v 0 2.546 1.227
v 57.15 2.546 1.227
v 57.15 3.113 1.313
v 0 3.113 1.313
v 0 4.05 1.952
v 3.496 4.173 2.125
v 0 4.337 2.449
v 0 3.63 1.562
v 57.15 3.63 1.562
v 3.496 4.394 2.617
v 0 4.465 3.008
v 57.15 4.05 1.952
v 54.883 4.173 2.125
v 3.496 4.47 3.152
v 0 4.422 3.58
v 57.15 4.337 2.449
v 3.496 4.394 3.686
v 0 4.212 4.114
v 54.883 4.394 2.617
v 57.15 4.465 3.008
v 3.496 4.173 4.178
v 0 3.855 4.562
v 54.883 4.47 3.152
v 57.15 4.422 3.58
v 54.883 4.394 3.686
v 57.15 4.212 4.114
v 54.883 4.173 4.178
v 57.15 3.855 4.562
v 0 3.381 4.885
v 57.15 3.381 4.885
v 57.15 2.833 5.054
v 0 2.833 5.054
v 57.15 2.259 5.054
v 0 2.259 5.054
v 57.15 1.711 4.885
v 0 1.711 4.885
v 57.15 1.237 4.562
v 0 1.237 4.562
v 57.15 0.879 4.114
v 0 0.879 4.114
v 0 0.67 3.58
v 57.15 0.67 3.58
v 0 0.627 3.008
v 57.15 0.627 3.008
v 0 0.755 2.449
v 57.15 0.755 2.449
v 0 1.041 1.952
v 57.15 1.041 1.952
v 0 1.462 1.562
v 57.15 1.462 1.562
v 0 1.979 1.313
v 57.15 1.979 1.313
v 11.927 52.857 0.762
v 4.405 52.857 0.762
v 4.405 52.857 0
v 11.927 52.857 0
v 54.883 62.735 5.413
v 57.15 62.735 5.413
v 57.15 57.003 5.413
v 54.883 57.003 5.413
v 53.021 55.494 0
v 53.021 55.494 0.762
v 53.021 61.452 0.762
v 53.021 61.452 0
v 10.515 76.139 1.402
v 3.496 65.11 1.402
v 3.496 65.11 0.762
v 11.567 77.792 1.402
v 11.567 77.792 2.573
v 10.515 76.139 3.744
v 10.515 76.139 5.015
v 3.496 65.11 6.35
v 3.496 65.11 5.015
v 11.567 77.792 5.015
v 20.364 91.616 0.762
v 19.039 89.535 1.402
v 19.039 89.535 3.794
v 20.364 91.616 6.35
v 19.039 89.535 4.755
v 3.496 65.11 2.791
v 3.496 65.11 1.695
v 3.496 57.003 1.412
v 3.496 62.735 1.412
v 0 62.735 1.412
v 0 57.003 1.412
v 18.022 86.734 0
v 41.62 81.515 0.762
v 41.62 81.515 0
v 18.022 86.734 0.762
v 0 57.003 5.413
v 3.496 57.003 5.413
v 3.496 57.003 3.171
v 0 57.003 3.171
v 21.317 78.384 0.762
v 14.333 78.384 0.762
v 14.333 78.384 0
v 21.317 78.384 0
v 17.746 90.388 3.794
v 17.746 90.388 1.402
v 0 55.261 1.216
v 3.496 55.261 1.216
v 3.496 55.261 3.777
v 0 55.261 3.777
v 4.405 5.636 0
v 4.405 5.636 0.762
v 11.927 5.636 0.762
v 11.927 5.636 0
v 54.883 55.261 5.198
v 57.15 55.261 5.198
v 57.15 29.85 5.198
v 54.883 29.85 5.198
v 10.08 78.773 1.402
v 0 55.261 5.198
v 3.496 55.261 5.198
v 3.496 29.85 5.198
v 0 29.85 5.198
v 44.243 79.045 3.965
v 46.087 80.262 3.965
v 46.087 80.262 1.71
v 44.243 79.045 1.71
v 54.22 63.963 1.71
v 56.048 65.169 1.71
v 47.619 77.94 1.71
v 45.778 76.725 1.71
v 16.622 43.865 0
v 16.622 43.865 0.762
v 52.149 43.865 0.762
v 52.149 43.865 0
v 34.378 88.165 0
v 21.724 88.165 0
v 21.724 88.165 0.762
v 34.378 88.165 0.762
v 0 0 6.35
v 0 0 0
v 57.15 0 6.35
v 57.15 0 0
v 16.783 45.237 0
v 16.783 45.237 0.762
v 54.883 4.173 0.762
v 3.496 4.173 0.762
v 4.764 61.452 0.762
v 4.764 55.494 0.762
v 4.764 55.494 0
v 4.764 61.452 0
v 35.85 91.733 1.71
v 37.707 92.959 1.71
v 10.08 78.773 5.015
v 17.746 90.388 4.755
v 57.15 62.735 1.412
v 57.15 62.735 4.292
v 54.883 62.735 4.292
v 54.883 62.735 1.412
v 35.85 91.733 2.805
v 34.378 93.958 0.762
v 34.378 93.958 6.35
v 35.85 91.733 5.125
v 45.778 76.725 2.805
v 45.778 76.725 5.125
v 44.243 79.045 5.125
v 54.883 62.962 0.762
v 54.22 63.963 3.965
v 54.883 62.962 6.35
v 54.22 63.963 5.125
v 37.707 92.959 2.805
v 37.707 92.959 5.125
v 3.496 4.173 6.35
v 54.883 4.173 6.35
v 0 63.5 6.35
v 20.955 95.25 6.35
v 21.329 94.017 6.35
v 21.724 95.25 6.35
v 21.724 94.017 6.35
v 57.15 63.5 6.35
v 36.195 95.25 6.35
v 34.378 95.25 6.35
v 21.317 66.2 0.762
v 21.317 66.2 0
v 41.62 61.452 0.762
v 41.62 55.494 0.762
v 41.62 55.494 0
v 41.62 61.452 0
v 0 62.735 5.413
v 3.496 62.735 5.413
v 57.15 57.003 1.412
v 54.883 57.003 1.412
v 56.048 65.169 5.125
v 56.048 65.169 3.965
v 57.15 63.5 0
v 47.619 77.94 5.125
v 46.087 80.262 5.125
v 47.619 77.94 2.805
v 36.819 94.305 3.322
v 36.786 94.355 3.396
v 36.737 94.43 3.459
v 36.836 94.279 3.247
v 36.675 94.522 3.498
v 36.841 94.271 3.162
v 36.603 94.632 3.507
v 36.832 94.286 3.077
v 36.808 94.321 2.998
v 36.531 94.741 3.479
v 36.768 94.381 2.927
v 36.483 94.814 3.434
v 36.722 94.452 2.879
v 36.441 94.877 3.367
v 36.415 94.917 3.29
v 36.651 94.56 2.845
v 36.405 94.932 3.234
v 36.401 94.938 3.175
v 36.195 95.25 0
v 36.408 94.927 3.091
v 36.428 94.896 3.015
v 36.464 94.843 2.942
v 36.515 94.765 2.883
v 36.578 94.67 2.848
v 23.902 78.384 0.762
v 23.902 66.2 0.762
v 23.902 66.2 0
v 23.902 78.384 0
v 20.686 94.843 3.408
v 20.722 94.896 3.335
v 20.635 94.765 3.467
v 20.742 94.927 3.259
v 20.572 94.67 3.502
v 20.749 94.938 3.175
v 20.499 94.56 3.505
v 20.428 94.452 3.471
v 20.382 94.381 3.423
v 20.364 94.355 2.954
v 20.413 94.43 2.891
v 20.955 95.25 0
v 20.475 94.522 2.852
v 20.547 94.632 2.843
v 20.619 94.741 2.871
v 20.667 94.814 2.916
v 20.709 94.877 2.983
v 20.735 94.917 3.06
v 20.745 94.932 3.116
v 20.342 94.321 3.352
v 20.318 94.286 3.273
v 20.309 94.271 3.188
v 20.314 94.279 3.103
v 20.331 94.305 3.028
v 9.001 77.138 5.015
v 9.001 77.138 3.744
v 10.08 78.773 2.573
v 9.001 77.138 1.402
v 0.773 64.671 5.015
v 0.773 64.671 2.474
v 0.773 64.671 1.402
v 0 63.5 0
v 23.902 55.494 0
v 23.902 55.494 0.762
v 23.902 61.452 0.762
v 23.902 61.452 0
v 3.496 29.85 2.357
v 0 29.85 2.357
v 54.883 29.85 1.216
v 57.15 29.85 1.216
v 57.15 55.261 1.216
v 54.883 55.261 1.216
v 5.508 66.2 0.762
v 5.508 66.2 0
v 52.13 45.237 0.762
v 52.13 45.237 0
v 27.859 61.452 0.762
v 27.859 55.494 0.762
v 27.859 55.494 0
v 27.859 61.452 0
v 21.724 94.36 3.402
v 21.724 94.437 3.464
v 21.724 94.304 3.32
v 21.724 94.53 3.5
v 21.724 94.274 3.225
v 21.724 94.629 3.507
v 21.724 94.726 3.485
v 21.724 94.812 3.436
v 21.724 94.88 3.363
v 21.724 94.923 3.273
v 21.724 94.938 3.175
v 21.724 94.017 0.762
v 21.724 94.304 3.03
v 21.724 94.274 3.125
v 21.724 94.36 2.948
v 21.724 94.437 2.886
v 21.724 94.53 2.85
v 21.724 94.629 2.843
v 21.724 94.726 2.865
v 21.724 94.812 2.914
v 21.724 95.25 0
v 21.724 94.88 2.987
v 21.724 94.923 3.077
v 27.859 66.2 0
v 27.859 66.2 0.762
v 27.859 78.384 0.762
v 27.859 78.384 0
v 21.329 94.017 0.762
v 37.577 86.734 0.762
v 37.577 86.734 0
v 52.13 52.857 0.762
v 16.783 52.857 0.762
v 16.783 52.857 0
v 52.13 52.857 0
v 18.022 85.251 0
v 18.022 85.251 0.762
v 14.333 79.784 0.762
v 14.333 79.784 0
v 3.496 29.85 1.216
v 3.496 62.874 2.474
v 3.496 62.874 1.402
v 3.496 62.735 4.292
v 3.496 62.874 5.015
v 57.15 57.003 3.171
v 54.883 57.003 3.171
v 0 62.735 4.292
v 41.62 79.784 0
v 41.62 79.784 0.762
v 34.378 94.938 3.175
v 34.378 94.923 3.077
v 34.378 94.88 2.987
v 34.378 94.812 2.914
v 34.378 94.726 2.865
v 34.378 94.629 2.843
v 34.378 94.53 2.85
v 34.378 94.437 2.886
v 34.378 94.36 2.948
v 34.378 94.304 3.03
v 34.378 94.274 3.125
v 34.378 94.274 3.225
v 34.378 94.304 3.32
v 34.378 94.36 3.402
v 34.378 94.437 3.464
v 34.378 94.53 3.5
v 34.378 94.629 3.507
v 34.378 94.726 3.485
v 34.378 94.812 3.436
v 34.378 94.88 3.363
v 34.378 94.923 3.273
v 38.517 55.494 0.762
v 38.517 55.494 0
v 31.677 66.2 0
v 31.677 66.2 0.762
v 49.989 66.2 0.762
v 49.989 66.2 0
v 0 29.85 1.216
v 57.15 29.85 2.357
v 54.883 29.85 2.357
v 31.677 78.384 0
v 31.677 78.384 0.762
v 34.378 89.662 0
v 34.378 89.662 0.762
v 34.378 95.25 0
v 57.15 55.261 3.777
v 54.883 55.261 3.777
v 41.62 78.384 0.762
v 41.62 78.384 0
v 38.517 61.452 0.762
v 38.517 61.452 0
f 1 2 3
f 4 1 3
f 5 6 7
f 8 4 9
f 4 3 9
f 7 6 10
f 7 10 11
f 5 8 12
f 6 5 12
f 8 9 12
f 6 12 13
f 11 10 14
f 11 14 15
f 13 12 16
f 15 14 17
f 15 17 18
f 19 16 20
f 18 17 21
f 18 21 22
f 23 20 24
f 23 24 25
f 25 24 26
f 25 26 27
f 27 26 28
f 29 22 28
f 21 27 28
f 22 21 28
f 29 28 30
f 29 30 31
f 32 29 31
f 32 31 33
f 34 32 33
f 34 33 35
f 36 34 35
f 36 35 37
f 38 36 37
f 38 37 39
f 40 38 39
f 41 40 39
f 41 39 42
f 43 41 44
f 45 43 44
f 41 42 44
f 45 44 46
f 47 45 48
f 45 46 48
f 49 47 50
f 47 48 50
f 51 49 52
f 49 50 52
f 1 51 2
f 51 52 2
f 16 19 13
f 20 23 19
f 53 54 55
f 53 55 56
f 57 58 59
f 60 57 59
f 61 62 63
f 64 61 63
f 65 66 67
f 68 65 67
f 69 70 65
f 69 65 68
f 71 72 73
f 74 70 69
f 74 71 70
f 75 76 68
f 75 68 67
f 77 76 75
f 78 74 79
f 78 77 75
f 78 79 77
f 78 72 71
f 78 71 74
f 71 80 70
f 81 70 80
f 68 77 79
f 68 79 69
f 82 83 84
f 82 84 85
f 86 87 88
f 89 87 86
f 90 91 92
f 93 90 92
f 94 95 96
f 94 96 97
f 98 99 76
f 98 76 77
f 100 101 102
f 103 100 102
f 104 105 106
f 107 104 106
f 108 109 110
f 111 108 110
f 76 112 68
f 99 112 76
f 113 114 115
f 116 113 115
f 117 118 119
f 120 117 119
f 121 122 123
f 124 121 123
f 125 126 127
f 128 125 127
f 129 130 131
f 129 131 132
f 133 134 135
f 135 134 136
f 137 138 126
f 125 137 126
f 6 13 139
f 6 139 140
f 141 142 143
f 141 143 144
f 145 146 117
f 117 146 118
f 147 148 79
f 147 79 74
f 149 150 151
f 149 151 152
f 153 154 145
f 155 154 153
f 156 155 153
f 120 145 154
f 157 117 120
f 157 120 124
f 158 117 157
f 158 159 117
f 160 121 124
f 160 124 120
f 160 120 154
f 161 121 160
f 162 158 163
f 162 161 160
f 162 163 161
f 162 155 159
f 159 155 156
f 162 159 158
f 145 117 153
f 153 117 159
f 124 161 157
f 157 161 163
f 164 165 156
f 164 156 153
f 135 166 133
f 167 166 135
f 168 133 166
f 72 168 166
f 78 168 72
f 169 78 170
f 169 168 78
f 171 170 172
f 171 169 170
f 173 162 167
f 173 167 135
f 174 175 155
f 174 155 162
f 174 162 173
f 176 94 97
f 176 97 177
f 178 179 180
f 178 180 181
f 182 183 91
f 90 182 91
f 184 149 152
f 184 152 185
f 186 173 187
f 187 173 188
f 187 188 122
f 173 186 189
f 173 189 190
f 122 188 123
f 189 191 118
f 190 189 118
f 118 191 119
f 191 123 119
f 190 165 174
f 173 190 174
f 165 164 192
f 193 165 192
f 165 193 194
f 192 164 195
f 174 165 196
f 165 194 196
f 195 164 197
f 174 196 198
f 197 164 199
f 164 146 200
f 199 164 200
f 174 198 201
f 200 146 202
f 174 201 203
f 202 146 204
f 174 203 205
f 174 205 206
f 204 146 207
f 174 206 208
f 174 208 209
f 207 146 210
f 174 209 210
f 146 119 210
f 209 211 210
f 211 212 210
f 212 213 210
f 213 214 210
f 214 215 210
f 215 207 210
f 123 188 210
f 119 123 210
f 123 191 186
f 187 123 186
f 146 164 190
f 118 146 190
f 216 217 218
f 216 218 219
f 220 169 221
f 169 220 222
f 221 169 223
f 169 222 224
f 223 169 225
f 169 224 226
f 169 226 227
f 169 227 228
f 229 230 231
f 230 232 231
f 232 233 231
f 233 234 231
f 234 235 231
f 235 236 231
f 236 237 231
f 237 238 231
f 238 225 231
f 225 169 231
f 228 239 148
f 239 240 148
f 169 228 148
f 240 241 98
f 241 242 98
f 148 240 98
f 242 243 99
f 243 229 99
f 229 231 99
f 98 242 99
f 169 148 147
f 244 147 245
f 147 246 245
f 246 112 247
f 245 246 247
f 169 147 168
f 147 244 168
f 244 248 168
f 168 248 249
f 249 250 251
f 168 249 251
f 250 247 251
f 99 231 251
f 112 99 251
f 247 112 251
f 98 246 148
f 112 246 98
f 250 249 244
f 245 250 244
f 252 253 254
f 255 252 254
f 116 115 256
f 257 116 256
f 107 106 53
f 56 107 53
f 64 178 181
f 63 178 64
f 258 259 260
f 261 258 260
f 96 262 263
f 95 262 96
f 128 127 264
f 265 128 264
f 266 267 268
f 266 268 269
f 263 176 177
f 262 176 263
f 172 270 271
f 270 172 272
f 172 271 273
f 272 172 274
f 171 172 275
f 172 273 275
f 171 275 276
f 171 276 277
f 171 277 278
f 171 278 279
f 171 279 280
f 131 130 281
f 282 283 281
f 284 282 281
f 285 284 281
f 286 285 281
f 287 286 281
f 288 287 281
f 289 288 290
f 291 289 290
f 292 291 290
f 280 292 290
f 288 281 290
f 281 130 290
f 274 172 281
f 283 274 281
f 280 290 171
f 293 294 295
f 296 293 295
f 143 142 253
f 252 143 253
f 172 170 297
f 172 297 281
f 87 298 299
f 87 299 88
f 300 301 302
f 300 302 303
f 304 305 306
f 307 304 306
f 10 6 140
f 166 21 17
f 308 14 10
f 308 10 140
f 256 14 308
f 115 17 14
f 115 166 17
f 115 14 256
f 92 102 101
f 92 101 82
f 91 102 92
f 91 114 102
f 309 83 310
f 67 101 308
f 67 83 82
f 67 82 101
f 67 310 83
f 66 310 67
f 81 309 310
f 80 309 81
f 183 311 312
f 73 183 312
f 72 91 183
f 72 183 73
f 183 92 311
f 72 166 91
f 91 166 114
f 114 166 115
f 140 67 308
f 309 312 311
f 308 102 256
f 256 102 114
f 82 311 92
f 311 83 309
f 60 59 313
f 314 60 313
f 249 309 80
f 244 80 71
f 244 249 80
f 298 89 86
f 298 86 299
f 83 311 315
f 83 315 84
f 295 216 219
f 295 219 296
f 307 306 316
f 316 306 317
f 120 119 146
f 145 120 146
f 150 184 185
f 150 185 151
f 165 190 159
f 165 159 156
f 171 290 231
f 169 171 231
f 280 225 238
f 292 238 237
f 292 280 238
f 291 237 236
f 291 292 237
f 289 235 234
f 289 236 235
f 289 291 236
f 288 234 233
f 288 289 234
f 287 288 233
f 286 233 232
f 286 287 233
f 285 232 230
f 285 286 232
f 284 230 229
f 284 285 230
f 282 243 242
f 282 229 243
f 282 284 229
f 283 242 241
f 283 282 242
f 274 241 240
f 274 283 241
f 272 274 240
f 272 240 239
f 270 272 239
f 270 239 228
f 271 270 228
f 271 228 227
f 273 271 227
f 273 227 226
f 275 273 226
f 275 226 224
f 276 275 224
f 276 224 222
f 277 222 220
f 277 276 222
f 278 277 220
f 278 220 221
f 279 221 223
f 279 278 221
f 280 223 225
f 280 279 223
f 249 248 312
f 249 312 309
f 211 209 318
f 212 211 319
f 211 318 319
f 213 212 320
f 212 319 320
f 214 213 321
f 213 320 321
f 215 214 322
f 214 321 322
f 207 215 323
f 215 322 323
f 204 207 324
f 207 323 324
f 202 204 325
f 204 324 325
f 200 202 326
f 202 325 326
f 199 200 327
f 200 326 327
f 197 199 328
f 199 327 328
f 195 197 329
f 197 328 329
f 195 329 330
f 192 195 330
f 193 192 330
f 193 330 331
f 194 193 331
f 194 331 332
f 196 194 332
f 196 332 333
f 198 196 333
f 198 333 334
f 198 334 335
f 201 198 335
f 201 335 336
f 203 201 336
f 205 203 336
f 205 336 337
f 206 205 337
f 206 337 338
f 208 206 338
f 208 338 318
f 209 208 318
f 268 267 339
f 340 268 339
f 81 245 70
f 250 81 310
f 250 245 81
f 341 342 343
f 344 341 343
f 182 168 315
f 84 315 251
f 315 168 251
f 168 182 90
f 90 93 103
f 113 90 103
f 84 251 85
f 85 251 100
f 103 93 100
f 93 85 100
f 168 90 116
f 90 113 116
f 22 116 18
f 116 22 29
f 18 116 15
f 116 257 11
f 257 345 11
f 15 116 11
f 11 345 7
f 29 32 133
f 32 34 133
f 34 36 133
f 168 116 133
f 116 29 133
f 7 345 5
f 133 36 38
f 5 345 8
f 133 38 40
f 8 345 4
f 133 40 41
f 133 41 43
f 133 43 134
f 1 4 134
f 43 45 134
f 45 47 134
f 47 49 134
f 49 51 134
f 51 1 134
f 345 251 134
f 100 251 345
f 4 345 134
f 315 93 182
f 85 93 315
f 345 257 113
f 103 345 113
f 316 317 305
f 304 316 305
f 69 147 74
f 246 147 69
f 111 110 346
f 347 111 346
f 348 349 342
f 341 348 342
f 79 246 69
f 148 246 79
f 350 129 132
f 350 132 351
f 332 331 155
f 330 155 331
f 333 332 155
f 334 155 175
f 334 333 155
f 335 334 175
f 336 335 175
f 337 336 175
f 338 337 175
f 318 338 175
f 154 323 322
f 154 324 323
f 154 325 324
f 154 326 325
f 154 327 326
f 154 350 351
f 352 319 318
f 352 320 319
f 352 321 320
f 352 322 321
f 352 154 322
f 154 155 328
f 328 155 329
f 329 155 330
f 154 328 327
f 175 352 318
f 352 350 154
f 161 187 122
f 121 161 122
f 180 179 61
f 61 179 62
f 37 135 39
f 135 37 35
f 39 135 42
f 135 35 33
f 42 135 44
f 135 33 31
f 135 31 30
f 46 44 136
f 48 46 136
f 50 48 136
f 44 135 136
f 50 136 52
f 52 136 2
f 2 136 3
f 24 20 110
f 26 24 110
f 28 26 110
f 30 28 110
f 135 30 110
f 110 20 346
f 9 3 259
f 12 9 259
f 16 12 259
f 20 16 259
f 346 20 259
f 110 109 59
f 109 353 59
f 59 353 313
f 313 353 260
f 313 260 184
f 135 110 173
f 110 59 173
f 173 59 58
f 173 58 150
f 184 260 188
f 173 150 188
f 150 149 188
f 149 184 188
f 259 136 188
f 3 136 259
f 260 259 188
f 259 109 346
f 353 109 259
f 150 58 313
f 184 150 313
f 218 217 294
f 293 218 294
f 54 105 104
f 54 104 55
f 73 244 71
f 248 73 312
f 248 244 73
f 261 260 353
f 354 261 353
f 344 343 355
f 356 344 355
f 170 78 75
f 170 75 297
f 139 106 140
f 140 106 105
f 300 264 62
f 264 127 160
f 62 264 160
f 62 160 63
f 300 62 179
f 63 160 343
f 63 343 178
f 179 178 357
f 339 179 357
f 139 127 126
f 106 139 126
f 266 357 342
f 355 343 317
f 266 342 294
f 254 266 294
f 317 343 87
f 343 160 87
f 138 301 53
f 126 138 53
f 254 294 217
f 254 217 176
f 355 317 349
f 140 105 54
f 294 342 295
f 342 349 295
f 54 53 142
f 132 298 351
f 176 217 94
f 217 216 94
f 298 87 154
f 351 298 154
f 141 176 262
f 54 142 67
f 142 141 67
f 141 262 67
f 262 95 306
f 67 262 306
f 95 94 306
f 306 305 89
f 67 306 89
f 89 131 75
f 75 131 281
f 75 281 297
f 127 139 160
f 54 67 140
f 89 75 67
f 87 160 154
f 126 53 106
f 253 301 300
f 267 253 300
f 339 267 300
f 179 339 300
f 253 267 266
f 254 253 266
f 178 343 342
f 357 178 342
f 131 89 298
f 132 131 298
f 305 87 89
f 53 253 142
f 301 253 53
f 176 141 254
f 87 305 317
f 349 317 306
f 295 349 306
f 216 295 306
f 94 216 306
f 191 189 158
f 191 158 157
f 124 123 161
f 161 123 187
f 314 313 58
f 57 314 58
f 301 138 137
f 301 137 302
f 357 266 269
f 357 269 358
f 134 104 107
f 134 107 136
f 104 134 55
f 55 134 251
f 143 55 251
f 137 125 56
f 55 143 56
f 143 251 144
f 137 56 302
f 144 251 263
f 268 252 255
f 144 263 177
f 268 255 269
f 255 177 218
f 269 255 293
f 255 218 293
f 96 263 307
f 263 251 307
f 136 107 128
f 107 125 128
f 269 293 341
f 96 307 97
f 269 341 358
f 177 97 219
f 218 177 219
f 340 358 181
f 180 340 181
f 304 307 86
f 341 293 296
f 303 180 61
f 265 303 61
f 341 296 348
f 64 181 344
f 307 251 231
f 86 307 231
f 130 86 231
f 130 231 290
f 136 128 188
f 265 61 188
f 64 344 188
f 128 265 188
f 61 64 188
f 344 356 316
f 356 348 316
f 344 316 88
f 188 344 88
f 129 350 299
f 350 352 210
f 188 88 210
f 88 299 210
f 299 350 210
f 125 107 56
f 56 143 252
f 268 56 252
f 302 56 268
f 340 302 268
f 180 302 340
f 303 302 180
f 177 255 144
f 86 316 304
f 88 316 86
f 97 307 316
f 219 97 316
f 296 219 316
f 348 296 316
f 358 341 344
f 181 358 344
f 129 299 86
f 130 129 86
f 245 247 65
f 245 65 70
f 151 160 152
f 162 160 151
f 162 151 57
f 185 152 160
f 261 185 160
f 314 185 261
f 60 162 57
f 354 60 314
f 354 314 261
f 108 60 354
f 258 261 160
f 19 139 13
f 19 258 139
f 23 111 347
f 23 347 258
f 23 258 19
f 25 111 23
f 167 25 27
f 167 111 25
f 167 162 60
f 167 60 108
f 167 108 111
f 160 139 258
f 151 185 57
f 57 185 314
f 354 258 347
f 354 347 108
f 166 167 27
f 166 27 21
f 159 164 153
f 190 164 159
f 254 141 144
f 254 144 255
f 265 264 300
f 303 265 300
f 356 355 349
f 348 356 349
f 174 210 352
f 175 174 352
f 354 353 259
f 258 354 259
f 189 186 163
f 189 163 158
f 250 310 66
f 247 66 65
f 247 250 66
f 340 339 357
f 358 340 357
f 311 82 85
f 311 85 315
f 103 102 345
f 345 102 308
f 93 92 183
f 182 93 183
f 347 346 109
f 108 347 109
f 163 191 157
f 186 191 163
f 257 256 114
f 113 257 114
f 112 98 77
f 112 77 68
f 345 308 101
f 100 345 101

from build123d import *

# Parameters (mm, degrees)
BOSS_EXTRUDE2_DEPTH      = 6.35
CUT_EXTRUDE1_DEPTH       = 5.588
CUT_EXTRUDE3_DEPTH       = 58.15
CUT_EXTRUDE4_DEPTH       = 58.15
CUT_EXTRUDE5_DEPTH       = 5.588
CUT_EXTRUDE6_DEPTH       = 5.588
SKETCH9_W                = 5.834897671
SKETCH9_H                = 6.35
CUT_EXTRUDE7_DEPTH       = 5.588
SKETCH14_W               = 35.347523306
SKETCH14_H               = 7.62
SKETCH14_W_2             = 7.5222908
SKETCH14_H_2             = 47.221578267
CUT_EXTRUDE15_DEPTH      = 1.762
CUT_EXTRUDE16_DEPTH      = 1.762
SKETCH16_W               = 19.137714492
SKETCH16_H               = 5.958224415
SKETCH16_W_2             = 10.658290022
SKETCH16_W_3             = 11.400659267
SKETCH16_W_4             = 3.957226521
SKETCH16_H_2             = 12.183905404
CUT_EXTRUDE18_DEPTH      = 1.762
SKETCH24_W               = 3.80459217
SKETCH24_H               = 5.588
CUT_EXTRUDE24_DEPTH      = 7.35
CUT_EXTRUDE25_DEPTH      = 11.684
SKETCH26_W               = 3.014165169
SKETCH26_H               = 5.588
CUT_EXTRUDE26_DEPTH      = 11.684
SKETCH28_R               = 0.333403054
CUT_EXTRUDE27_DEPTH      = 35.377669607
CUT_EXTRUDE27_DEPTH_BACK = 23.772330393
SKETCH29_R               = 1.924206534
CUT_EXTRUDE28_DEPTH      = 58.15


with BuildPart() as part:
    # Sketch1 → Boss-Extrude2 (new body)
    with BuildSketch(Plane.XY):
        Polygon((0, 0), (57.15, 0), (57.15, 63.5), (36.195, 95.25), (28.575, 95.25), (20.955, 95.25), (0, 63.5), align=None)
    extrude(amount=BOSS_EXTRUDE2_DEPTH)

    # Sketch2 → Cut-Extrude1 (cut)
    with BuildSketch(Plane.XY.offset(6.35)):
        Polygon((20.364000747, 91.616461208), (21.329039406, 94.01667417), (34.339089661, 94.01667417), (54.882736024, 62.961525589), (54.882736024, 4.173376451), (3.496365447, 4.173376451), (3.496365447, 65.109859062), align=None)
    extrude(amount=-CUT_EXTRUDE1_DEPTH, mode=Mode.SUBTRACT)

    # Sketch5 → Cut-Extrude3 (cut, through all)
    with BuildSketch(Plane(origin=(57.15, 0, 0), x_dir=(0, 0, -1), z_dir=(1, 0, 0))):
        Polygon((-5.197962118, 29.849901792), (-2.356915502, 29.849901792), (-5.197962118, 55.260698225), align=None)
        Polygon((-1.216346756, 29.849901792), (-1.216346756, 55.260698225), (-3.77743881, 55.260698225), align=None)
    extrude(amount=-CUT_EXTRUDE3_DEPTH, mode=Mode.SUBTRACT)

    # Sketch6 → Cut-Extrude4 (cut, through all)
    with BuildSketch(Plane(origin=(57.15, 0, 0), x_dir=(0, 0, -1), z_dir=(1, 0, 0))):
        Polygon((-5.412954005, 57.003118273), (-3.170845056, 57.003118273), (-5.412954005, 62.734975907), align=None)
        Polygon((-4.291899531, 62.734975907), (-1.412268241, 62.734975907), (-1.412268241, 57.003118273), align=None)
    extrude(amount=-CUT_EXTRUDE4_DEPTH, mode=Mode.SUBTRACT)

    # Sketch7 → Cut-Extrude5 (cut)
    with BuildSketch(Plane(origin=(69.002507662, 45.541655057, 0), x_dir=(0, 0, -1), z_dir=(0.834609407, 0.550842208, 0))):
        Polygon((-5.125103363, 23.517131124), (-5.125103363, 38.818816904), (-2.804754482, 38.818816904), align=None)
        Polygon((-3.964928922, 23.517131124), (-1.710138277, 23.517131124), (-1.710138277, 38.818816904), align=None)
        Polygon((-5.125103363, 41.600750711), (-5.125103363, 56.813922895), (-2.804754482, 56.813922895), align=None)
        Polygon((-3.964928922, 41.600750711), (-1.710138277, 41.600750711), (-1.710138277, 56.813922895), align=None)
    extrude(amount=-CUT_EXTRUDE5_DEPTH, mode=Mode.SUBTRACT)

    # Sketch8 → Cut-Extrude6 (cut)
    with BuildSketch(Plane(origin=(-29.193368626, 19.267623293, 0), x_dir=(0, 0, 1), z_dir=(-0.834609407, 0.550842208, 0))):
        Polygon((5.014666305, 54.401267981), (2.473695685, 54.401267981), (5.014666305, 69.338714317), align=None)
        Polygon((1.401941454, 54.401267981), (1.401941454, 69.338714317), (3.744180995, 69.338714317), align=None)
        Polygon((5.014666305, 71.297820033), (2.573061224, 71.297820033), (4.755204833, 85.214267299), align=None)
        Polygon((1.401941454, 71.297820033), (1.401941454, 85.214267299), (3.793863765, 85.214267299), align=None)
    extrude(amount=-CUT_EXTRUDE6_DEPTH, mode=Mode.SUBTRACT)

    # Sketch9 → Cut-Extrude7 (cut)
    with BuildSketch(Plane(origin=(0, 95.25, 0), x_dir=(1, 0, 0), z_dir=(0, 1, 0))):
        with Locations((28.446055603, -3.175)):
            Rectangle(SKETCH9_W, SKETCH9_H)
    extrude(amount=-CUT_EXTRUDE7_DEPTH, mode=Mode.SUBTRACT)

    # Sketch14 → Cut-Extrude15 (cut, through all)
    with BuildSketch(Plane.XY.offset(0.762)):
        with Locations((34.456497677, 49.047397654)):
            Rectangle(SKETCH14_W, SKETCH14_H)
        with Locations((8.166161846, 29.246608521)):
            Rectangle(SKETCH14_W_2, SKETCH14_H_2)
    extrude(amount=-CUT_EXTRUDE15_DEPTH, mode=Mode.SUBTRACT)

    # Sketch15 → Cut-Extrude16 (cut, through all)
    with BuildSketch(Plane.XY.offset(0.762)):
        Polygon((16.621939644, 43.865236106), (52.148781332, 43.865236106), (52.13025933, 45.237397654), (16.782736024, 45.237397654), align=None)
    extrude(amount=-CUT_EXTRUDE16_DEPTH, mode=Mode.SUBTRACT)

    # Sketch16 → Cut-Extrude18 (cut, through all)
    with BuildSketch(Plane.XY.offset(0.762)):
        with Locations((14.332787326, 58.472819058)):
            Rectangle(SKETCH16_W, SKETCH16_H)
        with Locations((33.188016104, 58.472819058)):
            Rectangle(SKETCH16_W_2, SKETCH16_H)
        with Locations((47.320715601, 58.472819058)):
            Rectangle(SKETCH16_W_3, SKETCH16_H)
        Polygon((49.98907512, 66.19967542), (41.620385968, 78.383580824), (31.6768604, 78.383580824), (31.6768604, 66.19967542), align=None)
        with Locations((25.880257832, 72.291628122)):
            Rectangle(SKETCH16_W_4, SKETCH16_H_2)
        Polygon((5.507881152, 66.19967542), (14.332787326, 78.383580824), (21.316943171, 78.383580824), (21.316943171, 66.19967542), align=None)
        Polygon((18.022227631, 85.25088415), (14.332787326, 79.783581396), (41.620385968, 79.783581396), align=None)
        Polygon((18.022227631, 86.733909891), (37.577072812, 86.733909891), (41.620385968, 81.514612422), align=None)
    extrude(amount=-CUT_EXTRUDE18_DEPTH, mode=Mode.SUBTRACT)

    # Sketch24 → Cut-Extrude24 (cut, through all)
    with BuildSketch(Plane(origin=(0, 0, 0), x_dir=(-1, 0, 0), z_dir=(0, 0, -1))):
        with Locations((-23.626310682, 92.456)):
            Rectangle(SKETCH24_W, SKETCH24_H)
    extrude(amount=-CUT_EXTRUDE24_DEPTH, mode=Mode.SUBTRACT)

    # Sketch25 → Cut-Extrude25 (cut)
    with BuildSketch(Plane(origin=(0, 0, 0), x_dir=(-1, 0, 0), z_dir=(0, 0, -1))):
        Polygon((-21.724014597, 89.662), (-21.724014597, 88.165353891), (-34.377669607, 88.165353891), (-34.377669607, 89.662), (-31.363504438, 89.662), align=None)
    extrude(amount=-CUT_EXTRUDE25_DEPTH, mode=Mode.SUBTRACT)

    # Sketch26 → Cut-Extrude26 (cut)
    with BuildSketch(Plane(origin=(0, 0, 0), x_dir=(-1, 0, 0), z_dir=(0, 0, -1))):
        with Locations((-32.870587023, 92.456)):
            Rectangle(SKETCH26_W, SKETCH26_H)
    extrude(amount=-CUT_EXTRUDE26_DEPTH, mode=Mode.SUBTRACT)

    # Sketch28 → Cut-Extrude27 (cut, two sides)
    with BuildSketch(Plane.ZY.offset(-34.377669607)) as cut_extrude27_sk:
        with Locations(Location((3.175, 94.604177073, 0), (0, 0, 90))):  # turned: the seam where the file's is
            Circle(SKETCH28_R)
    extrude(amount=CUT_EXTRUDE27_DEPTH, mode=Mode.SUBTRACT)
    extrude(cut_extrude27_sk.sketch, amount=-CUT_EXTRUDE27_DEPTH_BACK, mode=Mode.SUBTRACT)

    # Sketch29 → Cut-Extrude28 (cut, through all)
    with BuildSketch(Plane(origin=(57.15, 0, 0), x_dir=(0, 0, -1), z_dir=(1, 0, 0))):
        with Locations((-3.151671904, 2.54588231)):
            Circle(SKETCH29_R)
    extrude(amount=-CUT_EXTRUDE28_DEPTH, mode=Mode.SUBTRACT)


solid = part.part
